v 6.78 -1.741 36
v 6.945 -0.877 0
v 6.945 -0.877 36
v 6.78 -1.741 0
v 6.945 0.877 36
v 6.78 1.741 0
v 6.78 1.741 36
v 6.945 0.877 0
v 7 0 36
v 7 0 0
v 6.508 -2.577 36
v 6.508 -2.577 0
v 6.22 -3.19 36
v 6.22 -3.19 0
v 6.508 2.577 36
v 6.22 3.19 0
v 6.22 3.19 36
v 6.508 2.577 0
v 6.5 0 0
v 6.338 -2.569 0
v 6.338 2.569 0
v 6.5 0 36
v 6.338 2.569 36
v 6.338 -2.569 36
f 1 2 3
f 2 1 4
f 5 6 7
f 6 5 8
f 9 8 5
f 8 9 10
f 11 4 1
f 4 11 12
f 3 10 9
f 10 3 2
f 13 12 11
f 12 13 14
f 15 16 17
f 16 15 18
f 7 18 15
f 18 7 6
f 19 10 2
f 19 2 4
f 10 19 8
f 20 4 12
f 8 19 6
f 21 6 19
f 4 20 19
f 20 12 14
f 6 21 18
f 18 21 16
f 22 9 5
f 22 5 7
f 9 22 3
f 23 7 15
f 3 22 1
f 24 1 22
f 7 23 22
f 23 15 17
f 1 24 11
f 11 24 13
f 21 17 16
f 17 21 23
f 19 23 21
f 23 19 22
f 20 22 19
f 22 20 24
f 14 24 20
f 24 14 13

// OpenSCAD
$fn = 50;


difference() {
	union() {
		cylinder(h = 36, r = 7.0000000000);
		translate(v = [-17.0000000000, 0, 0]) {
			cylinder(h = 36, r = 7.0000000000);
		}
	}
	union() {
		cylinder(h = 36, r = 3.2500000000);
		cylinder(h = 36, r = 1.8000000000);
		cylinder(h = 36, r = 1.8000000000);
		cylinder(h = 36, r = 1.8000000000);
		translate(v = [-21.5000000000, 0, 0]) {
			hull() {
				translate(v = [-3.7500000000, 0.0000000000, 0]) {
					cylinder(h = 36, r = 10.5000000000);
				}
				translate(v = [3.7500000000, 0.0000000000, 0]) {
					cylinder(h = 36, r = 10.5000000000);
				}
				translate(v = [-3.7500000000, -0.0000000000, 0]) {
					cylinder(h = 36, r = 10.5000000000);
				}
				translate(v = [3.7500000000, -0.0000000000, 0]) {
					cylinder(h = 36, r = 10.5000000000);
				}
			}
		}
		translate(v = [-14.0000000000, 0, 0.0000000000]) {
			cylinder(h = 36, r = 20.5000000000);
		}
	}
}
